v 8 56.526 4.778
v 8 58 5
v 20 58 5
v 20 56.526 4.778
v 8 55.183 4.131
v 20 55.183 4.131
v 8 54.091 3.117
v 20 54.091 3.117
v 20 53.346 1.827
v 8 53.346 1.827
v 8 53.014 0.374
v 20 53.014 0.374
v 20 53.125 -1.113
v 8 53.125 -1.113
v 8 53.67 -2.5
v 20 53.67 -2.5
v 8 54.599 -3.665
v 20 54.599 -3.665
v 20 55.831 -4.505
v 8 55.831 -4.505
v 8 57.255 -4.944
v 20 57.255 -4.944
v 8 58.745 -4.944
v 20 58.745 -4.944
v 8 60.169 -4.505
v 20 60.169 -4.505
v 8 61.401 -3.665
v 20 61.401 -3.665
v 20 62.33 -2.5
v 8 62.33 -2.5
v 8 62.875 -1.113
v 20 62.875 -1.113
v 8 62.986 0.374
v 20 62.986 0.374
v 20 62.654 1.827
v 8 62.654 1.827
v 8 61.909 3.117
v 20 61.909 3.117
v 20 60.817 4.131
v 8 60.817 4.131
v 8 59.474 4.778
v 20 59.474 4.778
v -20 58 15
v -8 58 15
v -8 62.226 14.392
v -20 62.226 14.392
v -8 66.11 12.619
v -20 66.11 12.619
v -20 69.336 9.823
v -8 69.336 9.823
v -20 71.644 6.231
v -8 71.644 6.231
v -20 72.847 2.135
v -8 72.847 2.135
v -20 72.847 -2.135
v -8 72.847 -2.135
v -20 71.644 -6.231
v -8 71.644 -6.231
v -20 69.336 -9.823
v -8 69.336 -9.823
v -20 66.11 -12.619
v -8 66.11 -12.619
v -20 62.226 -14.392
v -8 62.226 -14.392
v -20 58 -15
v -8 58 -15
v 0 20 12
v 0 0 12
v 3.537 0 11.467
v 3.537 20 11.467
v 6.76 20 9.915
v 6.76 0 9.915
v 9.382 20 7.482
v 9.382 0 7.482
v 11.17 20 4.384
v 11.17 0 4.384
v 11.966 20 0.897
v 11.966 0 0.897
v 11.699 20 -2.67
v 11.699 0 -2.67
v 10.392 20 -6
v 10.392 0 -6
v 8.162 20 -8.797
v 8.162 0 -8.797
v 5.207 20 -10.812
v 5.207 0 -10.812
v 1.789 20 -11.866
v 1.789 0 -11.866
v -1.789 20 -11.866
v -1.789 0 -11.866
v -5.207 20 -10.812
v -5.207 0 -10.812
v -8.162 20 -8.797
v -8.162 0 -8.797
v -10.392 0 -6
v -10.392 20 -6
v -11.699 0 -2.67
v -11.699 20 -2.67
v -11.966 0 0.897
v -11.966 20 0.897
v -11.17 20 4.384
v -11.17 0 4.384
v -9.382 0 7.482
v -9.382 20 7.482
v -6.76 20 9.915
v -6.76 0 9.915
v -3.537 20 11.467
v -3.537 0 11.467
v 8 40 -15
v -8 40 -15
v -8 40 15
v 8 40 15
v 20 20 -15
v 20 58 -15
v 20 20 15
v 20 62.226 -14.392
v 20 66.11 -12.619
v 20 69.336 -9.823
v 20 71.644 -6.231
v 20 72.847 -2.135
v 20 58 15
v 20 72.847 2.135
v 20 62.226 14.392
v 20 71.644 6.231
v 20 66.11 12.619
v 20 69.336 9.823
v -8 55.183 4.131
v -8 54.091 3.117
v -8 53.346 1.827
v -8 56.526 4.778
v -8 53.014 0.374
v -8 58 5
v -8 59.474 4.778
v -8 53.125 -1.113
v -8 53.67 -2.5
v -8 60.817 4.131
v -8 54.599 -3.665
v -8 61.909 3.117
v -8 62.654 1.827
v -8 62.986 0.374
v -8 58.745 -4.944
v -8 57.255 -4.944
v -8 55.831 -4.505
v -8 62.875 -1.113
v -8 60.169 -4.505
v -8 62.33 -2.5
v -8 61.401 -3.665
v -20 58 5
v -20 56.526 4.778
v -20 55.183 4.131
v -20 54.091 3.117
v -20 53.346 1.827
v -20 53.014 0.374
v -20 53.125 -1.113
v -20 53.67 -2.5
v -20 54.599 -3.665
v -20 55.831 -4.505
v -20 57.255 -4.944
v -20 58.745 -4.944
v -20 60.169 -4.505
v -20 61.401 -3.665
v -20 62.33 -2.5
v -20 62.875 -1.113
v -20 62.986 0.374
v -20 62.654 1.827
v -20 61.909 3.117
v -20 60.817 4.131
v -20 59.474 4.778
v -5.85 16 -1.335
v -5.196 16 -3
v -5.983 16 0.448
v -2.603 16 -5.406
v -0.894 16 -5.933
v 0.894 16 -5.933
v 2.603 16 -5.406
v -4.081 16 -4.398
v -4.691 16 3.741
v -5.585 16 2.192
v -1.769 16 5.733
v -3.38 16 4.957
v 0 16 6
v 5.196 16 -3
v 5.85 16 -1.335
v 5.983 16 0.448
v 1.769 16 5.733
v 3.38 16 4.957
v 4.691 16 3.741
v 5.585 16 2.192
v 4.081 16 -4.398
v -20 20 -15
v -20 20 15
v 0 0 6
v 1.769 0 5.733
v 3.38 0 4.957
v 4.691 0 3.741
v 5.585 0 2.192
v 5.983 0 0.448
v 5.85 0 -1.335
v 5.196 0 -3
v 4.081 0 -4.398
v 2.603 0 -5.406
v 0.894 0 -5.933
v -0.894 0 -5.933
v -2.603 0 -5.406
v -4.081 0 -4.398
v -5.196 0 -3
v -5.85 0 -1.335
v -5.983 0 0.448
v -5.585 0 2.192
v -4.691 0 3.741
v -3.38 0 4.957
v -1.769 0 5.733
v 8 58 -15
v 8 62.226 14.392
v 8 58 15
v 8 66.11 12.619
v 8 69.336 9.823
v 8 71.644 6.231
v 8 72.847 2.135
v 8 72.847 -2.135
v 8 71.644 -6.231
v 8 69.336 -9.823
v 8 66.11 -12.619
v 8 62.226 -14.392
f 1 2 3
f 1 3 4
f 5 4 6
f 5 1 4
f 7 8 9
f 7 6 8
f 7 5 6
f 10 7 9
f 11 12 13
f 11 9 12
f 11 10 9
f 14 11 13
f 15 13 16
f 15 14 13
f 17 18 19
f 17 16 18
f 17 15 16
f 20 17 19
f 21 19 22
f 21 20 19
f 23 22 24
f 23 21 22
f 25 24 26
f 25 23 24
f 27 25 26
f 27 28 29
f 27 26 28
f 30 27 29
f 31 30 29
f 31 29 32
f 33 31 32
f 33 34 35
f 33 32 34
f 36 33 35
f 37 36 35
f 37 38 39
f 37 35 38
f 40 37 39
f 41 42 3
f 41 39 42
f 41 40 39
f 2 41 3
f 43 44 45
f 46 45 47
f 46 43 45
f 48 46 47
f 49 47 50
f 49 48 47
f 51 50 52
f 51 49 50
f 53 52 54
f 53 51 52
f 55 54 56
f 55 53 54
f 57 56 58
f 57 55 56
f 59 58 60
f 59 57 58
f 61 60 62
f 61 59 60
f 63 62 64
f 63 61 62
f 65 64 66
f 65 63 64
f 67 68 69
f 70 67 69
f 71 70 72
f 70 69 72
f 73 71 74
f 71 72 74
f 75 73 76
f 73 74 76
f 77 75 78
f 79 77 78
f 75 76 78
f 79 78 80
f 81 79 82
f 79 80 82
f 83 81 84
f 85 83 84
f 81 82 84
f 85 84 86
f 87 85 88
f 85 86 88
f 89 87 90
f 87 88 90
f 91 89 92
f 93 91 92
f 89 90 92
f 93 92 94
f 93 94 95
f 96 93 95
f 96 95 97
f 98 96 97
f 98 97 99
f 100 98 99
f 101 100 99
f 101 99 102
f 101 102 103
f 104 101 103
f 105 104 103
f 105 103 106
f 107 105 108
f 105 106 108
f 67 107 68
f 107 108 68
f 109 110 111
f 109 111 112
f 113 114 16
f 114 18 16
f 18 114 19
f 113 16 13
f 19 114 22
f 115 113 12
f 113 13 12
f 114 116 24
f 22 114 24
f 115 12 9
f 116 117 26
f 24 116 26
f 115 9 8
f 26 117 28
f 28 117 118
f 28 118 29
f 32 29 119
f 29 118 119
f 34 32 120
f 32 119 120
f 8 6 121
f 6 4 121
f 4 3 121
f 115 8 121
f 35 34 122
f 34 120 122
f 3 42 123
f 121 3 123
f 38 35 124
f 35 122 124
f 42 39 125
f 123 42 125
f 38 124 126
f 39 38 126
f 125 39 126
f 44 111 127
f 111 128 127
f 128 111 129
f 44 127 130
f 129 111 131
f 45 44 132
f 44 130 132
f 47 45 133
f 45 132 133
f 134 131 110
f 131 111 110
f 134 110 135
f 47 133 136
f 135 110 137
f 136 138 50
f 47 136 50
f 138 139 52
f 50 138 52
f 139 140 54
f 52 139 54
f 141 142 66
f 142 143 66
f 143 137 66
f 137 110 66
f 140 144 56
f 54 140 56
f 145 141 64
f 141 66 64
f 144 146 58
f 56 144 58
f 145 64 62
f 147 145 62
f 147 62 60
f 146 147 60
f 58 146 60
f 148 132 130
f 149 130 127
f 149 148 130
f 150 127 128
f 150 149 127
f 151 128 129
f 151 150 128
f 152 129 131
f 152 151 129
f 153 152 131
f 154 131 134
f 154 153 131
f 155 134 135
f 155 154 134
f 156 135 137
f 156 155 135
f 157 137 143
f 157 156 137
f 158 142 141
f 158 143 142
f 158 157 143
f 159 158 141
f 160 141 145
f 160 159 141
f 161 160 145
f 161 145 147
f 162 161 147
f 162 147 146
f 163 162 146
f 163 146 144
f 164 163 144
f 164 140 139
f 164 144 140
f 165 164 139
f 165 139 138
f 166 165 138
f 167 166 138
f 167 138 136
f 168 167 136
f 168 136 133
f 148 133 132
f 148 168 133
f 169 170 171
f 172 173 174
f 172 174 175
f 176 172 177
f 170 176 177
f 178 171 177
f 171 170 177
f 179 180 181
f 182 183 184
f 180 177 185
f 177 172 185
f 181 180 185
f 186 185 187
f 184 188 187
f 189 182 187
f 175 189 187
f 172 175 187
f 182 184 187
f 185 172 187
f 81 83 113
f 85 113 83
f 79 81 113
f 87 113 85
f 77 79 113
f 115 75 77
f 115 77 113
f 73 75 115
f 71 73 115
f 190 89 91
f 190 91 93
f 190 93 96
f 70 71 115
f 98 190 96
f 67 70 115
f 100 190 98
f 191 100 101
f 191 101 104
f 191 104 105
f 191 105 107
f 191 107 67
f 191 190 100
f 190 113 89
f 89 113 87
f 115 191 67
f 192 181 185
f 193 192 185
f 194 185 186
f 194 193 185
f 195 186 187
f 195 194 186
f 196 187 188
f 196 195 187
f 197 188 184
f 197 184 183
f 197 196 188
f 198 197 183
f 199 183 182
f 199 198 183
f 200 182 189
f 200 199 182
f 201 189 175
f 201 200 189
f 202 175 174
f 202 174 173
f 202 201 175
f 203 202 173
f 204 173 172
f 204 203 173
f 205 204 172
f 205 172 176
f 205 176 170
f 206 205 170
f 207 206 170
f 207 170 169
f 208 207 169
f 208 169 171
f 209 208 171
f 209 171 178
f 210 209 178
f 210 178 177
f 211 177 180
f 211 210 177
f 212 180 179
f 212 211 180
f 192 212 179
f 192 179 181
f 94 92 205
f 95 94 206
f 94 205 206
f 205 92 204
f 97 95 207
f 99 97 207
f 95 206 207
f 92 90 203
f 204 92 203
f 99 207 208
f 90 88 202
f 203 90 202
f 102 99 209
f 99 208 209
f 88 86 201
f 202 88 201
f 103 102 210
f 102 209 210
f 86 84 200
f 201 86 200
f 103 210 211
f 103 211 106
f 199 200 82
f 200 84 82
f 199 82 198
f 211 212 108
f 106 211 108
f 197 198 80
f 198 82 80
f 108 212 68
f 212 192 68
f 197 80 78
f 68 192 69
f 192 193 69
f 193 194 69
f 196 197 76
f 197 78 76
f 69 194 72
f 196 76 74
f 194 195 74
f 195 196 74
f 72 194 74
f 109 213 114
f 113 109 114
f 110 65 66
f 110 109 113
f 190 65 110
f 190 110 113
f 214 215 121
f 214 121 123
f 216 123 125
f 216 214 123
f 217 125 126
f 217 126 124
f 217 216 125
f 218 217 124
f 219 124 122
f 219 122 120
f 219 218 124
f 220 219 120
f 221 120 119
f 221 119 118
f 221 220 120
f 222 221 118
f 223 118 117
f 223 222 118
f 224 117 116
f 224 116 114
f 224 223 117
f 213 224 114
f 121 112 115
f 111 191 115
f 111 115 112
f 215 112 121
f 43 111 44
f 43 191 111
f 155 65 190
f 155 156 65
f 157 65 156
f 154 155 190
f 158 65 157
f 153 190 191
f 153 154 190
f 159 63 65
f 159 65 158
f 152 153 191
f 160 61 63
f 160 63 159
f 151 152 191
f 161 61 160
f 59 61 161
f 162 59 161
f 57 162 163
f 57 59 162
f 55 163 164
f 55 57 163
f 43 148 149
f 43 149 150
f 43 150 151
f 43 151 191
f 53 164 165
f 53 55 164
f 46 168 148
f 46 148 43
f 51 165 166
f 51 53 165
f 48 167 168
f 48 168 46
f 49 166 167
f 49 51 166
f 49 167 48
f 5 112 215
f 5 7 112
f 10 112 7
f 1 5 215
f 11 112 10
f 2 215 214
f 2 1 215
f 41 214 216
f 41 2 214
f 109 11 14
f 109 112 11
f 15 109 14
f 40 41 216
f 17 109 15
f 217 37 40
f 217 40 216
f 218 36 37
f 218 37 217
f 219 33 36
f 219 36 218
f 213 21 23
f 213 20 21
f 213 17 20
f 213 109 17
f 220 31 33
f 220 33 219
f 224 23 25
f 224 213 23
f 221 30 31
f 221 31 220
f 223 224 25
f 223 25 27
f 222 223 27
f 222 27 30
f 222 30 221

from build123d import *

# Parameters (mm, degrees)
EXTRUDE_1_DEPTH     = 40
SKETCH_2_R          = 12
EXTRUDE_2_DEPTH     = 20
SKETCH_3_W          = 16
SKETCH_3_H          = 43
CUT_EXTRUDE_1_DEPTH = 30
SKETCH_4_R          = 5
CUT_EXTRUDE_2_DEPTH = 85.581321815
SKETCH_5_R          = 6
CUT_EXTRUDE_3_DEPTH = 16


with BuildPart() as part:
    # 草图1 → 凸台-拉伸1 (new body)
    with BuildSketch(Plane(origin=(-20, 0, 0), x_dir=(0, 0, -1), z_dir=(1, 0, 0))):
        with BuildLine():
            Line((15, 20), (-15, 20))
            Line((-15, 20), (-15, 58))
            ThreePointArc((-15, 58), (0, 73), (15, 58))
            Line((15, 58), (15, 20))
        make_face()
    extrude(amount=EXTRUDE_1_DEPTH)

    # 草图2 → 凸台-拉伸2 (add)
    with BuildSketch(Plane(origin=(0, 0, 0), x_dir=(1, 0, 0), z_dir=(0, 1, 0))):
        with Locations(Location((0, 0, 0), (0, 0, 270))):
            Circle(SKETCH_2_R)
    extrude(amount=EXTRUDE_2_DEPTH)

    # 草图3 → 切除-拉伸1 (cut)
    with BuildSketch(Plane.XY.offset(-15)):
        with Locations((0, 61.5)):
            Rectangle(SKETCH_3_W, SKETCH_3_H)
    extrude(amount=CUT_EXTRUDE_1_DEPTH, mode=Mode.SUBTRACT)

    # 草图4 → 切除-拉伸2 (cut, through all)
    with BuildSketch(Plane(origin=(-20, 0, 0), x_dir=(0, 0, -1), z_dir=(1, 0, 0))):
        with Locations(Location((0, 58, 0), (0, 0, 180))):
            Circle(SKETCH_4_R)
    extrude(amount=CUT_EXTRUDE_2_DEPTH, mode=Mode.SUBTRACT)

    # 草图5 → 切除-拉伸3 (cut)
    with BuildSketch(Plane(origin=(0, 0, 0), x_dir=(1, 0, 0), z_dir=(0, 1, 0))):
        with Locations(Location((0, 0, 0), (0, 0, 270))):
            Circle(SKETCH_5_R)
    extrude(amount=CUT_EXTRUDE_3_DEPTH, mode=Mode.SUBTRACT)


solid = part.part
